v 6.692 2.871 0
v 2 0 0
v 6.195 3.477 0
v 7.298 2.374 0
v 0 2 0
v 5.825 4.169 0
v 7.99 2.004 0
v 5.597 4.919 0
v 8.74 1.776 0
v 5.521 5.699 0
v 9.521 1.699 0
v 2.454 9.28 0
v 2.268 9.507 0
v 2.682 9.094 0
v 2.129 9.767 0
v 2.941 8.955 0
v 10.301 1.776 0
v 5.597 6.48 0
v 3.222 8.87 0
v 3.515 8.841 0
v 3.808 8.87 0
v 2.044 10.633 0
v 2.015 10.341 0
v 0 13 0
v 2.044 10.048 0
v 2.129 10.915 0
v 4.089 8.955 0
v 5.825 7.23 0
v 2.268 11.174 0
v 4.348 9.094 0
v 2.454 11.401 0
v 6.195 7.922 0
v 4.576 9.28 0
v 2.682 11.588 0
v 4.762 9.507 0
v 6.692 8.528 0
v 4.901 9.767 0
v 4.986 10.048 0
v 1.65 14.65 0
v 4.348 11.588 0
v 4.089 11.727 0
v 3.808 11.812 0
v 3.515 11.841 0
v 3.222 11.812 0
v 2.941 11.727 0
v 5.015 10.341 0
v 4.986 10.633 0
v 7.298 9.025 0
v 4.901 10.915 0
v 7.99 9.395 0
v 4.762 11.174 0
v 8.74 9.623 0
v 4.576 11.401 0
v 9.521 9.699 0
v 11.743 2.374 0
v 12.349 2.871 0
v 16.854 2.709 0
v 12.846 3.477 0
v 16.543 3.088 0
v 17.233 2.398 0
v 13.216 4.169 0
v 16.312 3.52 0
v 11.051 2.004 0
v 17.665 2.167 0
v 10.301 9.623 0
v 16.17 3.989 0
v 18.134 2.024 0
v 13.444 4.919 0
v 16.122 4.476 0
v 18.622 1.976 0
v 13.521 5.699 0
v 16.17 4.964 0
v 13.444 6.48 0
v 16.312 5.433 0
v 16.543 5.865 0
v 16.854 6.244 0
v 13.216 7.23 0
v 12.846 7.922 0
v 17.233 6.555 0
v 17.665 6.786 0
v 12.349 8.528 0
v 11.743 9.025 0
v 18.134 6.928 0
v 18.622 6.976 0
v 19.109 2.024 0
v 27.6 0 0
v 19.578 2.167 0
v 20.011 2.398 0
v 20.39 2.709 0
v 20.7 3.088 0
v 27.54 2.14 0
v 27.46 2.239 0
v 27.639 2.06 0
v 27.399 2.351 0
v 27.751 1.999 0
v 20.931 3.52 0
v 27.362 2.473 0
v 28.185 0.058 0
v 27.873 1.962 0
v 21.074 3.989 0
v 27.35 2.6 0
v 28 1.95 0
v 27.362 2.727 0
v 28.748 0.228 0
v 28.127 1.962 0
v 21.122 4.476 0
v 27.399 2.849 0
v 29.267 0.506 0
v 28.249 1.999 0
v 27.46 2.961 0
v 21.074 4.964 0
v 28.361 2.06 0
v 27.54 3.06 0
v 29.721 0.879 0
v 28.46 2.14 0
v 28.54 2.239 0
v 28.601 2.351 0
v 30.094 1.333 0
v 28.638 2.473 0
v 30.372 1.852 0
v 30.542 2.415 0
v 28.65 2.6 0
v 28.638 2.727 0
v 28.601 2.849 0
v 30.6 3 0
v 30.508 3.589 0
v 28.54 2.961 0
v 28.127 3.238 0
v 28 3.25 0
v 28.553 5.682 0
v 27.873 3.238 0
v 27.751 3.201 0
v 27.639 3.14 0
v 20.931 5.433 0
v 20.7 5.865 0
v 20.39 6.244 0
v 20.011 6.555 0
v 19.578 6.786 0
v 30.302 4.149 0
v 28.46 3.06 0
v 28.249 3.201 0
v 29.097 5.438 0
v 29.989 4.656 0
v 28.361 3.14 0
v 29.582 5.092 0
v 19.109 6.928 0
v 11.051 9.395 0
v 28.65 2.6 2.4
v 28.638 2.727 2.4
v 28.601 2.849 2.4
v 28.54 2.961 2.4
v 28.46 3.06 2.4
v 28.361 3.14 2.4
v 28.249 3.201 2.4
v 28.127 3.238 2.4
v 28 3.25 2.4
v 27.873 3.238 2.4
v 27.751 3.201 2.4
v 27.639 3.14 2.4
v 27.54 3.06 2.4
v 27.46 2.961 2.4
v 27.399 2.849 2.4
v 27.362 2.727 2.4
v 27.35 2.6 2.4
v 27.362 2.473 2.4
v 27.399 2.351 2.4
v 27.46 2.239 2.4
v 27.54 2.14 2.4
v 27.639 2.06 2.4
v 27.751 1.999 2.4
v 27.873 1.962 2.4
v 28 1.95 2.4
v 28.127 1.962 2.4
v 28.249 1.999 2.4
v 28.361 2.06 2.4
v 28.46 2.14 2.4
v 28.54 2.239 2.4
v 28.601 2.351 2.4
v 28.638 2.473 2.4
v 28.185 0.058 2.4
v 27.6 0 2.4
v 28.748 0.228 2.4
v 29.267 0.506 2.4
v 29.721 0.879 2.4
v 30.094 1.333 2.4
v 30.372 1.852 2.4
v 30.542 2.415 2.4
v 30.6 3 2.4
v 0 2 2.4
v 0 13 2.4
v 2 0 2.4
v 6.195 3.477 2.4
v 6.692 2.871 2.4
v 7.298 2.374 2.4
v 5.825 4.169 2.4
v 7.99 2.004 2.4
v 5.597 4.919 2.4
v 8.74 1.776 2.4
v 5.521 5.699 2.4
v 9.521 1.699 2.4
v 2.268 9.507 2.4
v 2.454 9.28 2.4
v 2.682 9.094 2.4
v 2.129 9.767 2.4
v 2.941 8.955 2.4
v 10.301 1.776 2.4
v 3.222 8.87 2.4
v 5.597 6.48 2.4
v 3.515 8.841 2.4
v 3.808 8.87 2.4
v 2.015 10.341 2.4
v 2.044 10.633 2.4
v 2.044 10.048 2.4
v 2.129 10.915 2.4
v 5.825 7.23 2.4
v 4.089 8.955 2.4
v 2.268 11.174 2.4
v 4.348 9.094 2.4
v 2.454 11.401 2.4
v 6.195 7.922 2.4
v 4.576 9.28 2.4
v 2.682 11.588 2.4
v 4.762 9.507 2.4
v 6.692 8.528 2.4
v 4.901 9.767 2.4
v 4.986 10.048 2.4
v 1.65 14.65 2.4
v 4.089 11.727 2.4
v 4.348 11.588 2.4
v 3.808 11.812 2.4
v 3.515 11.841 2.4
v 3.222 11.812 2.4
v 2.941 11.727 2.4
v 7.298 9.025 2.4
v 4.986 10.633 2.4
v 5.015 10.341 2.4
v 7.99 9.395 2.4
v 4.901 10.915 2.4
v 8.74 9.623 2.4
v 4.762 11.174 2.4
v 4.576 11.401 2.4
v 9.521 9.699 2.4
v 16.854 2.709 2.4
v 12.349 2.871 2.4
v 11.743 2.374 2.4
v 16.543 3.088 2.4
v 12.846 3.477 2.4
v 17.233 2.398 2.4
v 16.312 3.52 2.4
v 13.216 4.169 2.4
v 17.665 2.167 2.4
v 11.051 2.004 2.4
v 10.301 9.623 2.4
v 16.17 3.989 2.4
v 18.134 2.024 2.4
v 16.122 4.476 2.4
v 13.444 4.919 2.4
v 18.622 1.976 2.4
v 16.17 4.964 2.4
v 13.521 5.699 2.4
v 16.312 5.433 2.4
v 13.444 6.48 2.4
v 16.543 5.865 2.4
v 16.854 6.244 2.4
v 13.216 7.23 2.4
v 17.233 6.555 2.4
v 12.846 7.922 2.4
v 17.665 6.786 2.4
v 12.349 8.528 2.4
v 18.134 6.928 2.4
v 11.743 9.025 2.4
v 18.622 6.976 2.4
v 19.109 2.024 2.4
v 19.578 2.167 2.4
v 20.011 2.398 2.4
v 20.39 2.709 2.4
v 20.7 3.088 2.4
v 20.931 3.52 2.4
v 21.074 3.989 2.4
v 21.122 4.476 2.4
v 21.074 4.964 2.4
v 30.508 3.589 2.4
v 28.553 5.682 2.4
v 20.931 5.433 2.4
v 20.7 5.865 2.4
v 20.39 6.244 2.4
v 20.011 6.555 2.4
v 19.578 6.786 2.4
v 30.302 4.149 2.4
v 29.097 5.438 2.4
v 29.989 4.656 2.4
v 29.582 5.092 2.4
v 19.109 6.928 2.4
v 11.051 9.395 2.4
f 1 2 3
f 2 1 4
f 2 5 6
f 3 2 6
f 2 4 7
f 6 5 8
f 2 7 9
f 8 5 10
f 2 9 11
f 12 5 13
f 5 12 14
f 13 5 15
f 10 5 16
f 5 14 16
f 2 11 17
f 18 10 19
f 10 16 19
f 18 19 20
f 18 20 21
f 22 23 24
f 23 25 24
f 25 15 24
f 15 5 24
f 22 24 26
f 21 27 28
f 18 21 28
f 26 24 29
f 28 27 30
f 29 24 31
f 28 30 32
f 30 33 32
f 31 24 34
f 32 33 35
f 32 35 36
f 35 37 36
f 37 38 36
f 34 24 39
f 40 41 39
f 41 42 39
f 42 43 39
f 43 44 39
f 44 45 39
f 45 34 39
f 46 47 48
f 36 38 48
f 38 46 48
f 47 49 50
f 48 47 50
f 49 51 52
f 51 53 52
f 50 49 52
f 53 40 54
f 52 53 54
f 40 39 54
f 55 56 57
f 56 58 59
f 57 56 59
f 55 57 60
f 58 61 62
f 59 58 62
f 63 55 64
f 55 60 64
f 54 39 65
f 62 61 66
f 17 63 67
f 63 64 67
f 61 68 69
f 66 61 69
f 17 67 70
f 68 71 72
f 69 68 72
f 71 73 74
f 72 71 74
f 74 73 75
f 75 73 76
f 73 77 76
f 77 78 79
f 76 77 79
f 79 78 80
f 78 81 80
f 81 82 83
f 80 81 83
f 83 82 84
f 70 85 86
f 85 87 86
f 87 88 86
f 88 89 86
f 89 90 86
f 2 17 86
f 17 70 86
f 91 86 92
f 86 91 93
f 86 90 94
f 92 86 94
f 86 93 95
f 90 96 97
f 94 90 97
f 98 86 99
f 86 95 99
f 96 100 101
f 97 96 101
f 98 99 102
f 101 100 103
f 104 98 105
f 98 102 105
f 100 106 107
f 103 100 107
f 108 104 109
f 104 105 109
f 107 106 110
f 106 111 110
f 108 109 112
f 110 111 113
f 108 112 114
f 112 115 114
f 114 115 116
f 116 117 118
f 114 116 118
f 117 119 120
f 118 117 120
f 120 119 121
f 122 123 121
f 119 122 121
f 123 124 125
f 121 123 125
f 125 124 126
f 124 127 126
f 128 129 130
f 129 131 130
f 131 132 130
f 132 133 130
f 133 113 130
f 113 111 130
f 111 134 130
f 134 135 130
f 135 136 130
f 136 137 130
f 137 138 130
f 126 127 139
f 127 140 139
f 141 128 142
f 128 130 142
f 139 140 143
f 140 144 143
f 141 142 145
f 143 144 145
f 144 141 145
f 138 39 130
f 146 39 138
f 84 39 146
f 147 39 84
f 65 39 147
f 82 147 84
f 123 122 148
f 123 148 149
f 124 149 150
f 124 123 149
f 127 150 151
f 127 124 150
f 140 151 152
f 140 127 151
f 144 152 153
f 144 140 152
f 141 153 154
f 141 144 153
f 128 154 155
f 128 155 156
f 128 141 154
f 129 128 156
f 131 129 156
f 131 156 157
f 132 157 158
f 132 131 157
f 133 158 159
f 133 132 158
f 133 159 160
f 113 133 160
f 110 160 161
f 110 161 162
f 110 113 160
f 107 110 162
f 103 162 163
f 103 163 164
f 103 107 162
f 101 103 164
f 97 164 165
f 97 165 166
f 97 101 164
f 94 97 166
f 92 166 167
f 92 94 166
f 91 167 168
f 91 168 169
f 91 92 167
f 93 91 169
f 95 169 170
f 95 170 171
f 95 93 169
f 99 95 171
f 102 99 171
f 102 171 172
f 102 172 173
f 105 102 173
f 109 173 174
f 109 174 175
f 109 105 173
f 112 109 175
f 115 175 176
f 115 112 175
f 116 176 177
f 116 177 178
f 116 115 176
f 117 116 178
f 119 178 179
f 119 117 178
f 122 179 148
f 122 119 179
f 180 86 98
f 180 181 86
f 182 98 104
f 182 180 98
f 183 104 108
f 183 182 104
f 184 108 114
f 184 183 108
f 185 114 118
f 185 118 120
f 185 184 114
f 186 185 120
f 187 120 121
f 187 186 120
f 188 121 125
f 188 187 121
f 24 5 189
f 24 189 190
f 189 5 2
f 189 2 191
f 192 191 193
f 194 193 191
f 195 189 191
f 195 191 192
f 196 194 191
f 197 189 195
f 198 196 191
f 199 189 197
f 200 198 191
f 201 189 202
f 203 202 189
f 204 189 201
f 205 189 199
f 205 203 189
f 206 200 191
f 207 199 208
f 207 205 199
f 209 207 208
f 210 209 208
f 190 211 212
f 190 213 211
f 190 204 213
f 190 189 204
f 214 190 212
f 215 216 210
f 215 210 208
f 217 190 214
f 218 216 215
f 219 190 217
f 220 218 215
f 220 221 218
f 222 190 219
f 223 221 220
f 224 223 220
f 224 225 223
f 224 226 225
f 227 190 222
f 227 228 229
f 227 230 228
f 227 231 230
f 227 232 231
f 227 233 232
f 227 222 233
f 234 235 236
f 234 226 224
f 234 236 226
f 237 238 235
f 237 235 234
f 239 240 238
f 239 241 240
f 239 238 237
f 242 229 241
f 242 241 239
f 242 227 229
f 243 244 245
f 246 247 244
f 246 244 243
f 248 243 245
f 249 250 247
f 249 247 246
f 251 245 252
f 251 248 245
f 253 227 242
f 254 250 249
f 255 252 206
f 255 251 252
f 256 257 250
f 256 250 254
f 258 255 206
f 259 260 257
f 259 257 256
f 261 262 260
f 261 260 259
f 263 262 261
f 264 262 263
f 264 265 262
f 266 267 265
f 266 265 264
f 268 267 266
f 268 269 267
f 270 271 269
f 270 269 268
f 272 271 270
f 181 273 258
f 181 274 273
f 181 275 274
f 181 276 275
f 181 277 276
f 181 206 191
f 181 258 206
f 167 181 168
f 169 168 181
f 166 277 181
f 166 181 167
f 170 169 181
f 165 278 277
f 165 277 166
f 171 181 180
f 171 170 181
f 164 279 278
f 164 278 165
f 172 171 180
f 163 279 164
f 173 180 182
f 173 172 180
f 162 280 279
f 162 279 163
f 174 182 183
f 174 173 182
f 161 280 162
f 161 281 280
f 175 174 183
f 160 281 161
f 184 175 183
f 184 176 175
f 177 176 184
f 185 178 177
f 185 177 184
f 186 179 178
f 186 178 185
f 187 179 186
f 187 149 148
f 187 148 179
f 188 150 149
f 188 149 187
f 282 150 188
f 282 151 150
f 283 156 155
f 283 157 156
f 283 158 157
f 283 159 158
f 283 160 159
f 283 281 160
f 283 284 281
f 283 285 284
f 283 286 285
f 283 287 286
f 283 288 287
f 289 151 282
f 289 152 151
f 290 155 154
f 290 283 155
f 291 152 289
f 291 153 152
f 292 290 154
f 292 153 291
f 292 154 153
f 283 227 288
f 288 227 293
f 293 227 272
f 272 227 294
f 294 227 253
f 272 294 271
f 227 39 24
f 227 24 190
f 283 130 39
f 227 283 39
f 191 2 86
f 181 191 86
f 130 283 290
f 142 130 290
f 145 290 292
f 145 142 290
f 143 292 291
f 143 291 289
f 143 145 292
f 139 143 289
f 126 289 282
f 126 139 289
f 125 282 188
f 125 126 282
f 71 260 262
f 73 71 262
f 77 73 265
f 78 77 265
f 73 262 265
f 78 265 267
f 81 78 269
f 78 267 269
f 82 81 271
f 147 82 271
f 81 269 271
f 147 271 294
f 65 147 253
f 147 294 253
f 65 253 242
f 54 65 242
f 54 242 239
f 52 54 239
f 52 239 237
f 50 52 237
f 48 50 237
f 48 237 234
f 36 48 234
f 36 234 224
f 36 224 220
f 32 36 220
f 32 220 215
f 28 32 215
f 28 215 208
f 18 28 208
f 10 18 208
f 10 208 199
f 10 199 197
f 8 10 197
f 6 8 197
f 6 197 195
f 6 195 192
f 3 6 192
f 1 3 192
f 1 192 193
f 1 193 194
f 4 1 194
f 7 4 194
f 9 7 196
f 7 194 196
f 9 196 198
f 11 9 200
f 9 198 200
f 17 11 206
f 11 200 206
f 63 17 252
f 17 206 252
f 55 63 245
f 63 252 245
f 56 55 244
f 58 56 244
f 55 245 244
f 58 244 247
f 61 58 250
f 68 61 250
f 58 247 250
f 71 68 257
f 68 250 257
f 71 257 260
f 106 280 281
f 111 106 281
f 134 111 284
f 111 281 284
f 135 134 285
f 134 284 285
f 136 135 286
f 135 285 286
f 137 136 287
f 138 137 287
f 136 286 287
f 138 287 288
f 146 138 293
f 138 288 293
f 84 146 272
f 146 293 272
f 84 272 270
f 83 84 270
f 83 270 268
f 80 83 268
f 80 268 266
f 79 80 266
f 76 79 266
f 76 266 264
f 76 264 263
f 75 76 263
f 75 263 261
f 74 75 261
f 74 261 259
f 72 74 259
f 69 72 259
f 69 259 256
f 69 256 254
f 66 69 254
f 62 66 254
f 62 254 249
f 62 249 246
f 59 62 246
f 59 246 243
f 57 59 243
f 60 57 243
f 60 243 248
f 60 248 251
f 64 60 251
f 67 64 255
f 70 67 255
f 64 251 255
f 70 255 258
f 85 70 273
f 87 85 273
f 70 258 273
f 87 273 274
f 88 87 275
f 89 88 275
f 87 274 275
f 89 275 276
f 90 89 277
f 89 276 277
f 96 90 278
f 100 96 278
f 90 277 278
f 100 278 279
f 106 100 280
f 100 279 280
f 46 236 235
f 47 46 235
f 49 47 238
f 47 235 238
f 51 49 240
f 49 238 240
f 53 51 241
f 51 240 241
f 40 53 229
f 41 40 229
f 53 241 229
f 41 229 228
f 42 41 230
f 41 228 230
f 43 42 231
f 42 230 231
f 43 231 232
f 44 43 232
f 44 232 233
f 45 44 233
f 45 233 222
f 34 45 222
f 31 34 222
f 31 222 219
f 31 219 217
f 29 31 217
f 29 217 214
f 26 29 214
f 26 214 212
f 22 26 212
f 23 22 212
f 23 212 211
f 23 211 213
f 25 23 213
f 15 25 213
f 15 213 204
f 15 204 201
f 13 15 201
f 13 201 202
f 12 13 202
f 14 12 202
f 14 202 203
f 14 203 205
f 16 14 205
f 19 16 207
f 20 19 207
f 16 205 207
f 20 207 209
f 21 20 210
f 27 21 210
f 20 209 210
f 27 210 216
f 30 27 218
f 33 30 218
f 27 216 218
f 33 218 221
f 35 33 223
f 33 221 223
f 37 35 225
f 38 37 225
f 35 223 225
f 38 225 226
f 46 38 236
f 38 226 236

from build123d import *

# Parameters (mm, degrees)
F0_W        = 30.6
F0_H        = 15
F0_R        = 0.65
F1_DEPTH    = 2.4
F2_R        = 3
F3_SIZE     = 2
F4_T1_DEPTH = 158.1036606393
F5_T1_DEPTH = 13.1878115659
F6_R        = 1.5
F6_R_2      = 4
F6_R_3      = 2.5
F7_DEPTH    = 25


# Not quite as in the source:
# - a fillet or chamfer that OpenCascade refuses, or shapes differently, is made with other operations: its cross-section is extruded or revolved along the edge and cut away or added


with BuildPart() as f1:
    # F0 (on Top) → F1 (new body)
    with BuildSketch(Plane.XY):
        with Locations((15.3, 7.5)):
            Rectangle(F0_W, F0_H)
        with Locations((28, 2.6)):
            Circle(F0_R, mode=Mode.SUBTRACT)
    extrude(amount=F1_DEPTH)

    # F2
    f2_edges = [f1.edges().sort_by_distance(p)[0] for p in [
        (30.6, 0, 1.2),
    ]]
    fillet(f2_edges, radius=F2_R)

    # F3
    f3_edges = [f1.edges().sort_by_distance(p)[0] for p in [
        (0, 0, 1.2),
        (0, 15, 1.2),
    ]]
    chamfer(f3_edges, length=F3_SIZE)

    # F4: chamfer of 30 x 10 on 1 edges, made by hand

    # F4_s2 → F4_t1 (cut)
    with BuildSketch(Plane.XY.offset(-77.8518303197)):
        Polygon((30.6, 5), (0.6, 15), (30.6, 15), align=None)
    extrude(amount=F4_T1_DEPTH, mode=Mode.SUBTRACT)

    # F5: fillet of radius 3 on 1 edges, made by hand

    # F5_s2 → F5_t1 (cut)
    with BuildSketch(Plane.XY.offset(-5.3939057829)):
        with BuildLine():
            ThreePointArc((28.553156669, 5.6822811103), (29.9893960062, 4.6561608917), (30.6, 3))
            Line((30.6, 3), (30.6, 5))
            Line((30.6, 5), (28.553156669, 5.6822811103))
        make_face()
    extrude(amount=F5_T1_DEPTH, mode=Mode.SUBTRACT)

    # F6 (on face) → F7 (cut)
    with BuildSketch(Plane.XY.offset(2.4)):
        with Locations((3.5149192099, 10.3407332852)):
            Circle(F6_R)
        with Locations((9.5205735153, 5.6994225355)):
            Circle(F6_R_2)
        with Locations((18.6217441043, 4.476449427)):
            Circle(F6_R_3)
    extrude(amount=-F7_DEPTH, mode=Mode.SUBTRACT)


solid = f1.part
